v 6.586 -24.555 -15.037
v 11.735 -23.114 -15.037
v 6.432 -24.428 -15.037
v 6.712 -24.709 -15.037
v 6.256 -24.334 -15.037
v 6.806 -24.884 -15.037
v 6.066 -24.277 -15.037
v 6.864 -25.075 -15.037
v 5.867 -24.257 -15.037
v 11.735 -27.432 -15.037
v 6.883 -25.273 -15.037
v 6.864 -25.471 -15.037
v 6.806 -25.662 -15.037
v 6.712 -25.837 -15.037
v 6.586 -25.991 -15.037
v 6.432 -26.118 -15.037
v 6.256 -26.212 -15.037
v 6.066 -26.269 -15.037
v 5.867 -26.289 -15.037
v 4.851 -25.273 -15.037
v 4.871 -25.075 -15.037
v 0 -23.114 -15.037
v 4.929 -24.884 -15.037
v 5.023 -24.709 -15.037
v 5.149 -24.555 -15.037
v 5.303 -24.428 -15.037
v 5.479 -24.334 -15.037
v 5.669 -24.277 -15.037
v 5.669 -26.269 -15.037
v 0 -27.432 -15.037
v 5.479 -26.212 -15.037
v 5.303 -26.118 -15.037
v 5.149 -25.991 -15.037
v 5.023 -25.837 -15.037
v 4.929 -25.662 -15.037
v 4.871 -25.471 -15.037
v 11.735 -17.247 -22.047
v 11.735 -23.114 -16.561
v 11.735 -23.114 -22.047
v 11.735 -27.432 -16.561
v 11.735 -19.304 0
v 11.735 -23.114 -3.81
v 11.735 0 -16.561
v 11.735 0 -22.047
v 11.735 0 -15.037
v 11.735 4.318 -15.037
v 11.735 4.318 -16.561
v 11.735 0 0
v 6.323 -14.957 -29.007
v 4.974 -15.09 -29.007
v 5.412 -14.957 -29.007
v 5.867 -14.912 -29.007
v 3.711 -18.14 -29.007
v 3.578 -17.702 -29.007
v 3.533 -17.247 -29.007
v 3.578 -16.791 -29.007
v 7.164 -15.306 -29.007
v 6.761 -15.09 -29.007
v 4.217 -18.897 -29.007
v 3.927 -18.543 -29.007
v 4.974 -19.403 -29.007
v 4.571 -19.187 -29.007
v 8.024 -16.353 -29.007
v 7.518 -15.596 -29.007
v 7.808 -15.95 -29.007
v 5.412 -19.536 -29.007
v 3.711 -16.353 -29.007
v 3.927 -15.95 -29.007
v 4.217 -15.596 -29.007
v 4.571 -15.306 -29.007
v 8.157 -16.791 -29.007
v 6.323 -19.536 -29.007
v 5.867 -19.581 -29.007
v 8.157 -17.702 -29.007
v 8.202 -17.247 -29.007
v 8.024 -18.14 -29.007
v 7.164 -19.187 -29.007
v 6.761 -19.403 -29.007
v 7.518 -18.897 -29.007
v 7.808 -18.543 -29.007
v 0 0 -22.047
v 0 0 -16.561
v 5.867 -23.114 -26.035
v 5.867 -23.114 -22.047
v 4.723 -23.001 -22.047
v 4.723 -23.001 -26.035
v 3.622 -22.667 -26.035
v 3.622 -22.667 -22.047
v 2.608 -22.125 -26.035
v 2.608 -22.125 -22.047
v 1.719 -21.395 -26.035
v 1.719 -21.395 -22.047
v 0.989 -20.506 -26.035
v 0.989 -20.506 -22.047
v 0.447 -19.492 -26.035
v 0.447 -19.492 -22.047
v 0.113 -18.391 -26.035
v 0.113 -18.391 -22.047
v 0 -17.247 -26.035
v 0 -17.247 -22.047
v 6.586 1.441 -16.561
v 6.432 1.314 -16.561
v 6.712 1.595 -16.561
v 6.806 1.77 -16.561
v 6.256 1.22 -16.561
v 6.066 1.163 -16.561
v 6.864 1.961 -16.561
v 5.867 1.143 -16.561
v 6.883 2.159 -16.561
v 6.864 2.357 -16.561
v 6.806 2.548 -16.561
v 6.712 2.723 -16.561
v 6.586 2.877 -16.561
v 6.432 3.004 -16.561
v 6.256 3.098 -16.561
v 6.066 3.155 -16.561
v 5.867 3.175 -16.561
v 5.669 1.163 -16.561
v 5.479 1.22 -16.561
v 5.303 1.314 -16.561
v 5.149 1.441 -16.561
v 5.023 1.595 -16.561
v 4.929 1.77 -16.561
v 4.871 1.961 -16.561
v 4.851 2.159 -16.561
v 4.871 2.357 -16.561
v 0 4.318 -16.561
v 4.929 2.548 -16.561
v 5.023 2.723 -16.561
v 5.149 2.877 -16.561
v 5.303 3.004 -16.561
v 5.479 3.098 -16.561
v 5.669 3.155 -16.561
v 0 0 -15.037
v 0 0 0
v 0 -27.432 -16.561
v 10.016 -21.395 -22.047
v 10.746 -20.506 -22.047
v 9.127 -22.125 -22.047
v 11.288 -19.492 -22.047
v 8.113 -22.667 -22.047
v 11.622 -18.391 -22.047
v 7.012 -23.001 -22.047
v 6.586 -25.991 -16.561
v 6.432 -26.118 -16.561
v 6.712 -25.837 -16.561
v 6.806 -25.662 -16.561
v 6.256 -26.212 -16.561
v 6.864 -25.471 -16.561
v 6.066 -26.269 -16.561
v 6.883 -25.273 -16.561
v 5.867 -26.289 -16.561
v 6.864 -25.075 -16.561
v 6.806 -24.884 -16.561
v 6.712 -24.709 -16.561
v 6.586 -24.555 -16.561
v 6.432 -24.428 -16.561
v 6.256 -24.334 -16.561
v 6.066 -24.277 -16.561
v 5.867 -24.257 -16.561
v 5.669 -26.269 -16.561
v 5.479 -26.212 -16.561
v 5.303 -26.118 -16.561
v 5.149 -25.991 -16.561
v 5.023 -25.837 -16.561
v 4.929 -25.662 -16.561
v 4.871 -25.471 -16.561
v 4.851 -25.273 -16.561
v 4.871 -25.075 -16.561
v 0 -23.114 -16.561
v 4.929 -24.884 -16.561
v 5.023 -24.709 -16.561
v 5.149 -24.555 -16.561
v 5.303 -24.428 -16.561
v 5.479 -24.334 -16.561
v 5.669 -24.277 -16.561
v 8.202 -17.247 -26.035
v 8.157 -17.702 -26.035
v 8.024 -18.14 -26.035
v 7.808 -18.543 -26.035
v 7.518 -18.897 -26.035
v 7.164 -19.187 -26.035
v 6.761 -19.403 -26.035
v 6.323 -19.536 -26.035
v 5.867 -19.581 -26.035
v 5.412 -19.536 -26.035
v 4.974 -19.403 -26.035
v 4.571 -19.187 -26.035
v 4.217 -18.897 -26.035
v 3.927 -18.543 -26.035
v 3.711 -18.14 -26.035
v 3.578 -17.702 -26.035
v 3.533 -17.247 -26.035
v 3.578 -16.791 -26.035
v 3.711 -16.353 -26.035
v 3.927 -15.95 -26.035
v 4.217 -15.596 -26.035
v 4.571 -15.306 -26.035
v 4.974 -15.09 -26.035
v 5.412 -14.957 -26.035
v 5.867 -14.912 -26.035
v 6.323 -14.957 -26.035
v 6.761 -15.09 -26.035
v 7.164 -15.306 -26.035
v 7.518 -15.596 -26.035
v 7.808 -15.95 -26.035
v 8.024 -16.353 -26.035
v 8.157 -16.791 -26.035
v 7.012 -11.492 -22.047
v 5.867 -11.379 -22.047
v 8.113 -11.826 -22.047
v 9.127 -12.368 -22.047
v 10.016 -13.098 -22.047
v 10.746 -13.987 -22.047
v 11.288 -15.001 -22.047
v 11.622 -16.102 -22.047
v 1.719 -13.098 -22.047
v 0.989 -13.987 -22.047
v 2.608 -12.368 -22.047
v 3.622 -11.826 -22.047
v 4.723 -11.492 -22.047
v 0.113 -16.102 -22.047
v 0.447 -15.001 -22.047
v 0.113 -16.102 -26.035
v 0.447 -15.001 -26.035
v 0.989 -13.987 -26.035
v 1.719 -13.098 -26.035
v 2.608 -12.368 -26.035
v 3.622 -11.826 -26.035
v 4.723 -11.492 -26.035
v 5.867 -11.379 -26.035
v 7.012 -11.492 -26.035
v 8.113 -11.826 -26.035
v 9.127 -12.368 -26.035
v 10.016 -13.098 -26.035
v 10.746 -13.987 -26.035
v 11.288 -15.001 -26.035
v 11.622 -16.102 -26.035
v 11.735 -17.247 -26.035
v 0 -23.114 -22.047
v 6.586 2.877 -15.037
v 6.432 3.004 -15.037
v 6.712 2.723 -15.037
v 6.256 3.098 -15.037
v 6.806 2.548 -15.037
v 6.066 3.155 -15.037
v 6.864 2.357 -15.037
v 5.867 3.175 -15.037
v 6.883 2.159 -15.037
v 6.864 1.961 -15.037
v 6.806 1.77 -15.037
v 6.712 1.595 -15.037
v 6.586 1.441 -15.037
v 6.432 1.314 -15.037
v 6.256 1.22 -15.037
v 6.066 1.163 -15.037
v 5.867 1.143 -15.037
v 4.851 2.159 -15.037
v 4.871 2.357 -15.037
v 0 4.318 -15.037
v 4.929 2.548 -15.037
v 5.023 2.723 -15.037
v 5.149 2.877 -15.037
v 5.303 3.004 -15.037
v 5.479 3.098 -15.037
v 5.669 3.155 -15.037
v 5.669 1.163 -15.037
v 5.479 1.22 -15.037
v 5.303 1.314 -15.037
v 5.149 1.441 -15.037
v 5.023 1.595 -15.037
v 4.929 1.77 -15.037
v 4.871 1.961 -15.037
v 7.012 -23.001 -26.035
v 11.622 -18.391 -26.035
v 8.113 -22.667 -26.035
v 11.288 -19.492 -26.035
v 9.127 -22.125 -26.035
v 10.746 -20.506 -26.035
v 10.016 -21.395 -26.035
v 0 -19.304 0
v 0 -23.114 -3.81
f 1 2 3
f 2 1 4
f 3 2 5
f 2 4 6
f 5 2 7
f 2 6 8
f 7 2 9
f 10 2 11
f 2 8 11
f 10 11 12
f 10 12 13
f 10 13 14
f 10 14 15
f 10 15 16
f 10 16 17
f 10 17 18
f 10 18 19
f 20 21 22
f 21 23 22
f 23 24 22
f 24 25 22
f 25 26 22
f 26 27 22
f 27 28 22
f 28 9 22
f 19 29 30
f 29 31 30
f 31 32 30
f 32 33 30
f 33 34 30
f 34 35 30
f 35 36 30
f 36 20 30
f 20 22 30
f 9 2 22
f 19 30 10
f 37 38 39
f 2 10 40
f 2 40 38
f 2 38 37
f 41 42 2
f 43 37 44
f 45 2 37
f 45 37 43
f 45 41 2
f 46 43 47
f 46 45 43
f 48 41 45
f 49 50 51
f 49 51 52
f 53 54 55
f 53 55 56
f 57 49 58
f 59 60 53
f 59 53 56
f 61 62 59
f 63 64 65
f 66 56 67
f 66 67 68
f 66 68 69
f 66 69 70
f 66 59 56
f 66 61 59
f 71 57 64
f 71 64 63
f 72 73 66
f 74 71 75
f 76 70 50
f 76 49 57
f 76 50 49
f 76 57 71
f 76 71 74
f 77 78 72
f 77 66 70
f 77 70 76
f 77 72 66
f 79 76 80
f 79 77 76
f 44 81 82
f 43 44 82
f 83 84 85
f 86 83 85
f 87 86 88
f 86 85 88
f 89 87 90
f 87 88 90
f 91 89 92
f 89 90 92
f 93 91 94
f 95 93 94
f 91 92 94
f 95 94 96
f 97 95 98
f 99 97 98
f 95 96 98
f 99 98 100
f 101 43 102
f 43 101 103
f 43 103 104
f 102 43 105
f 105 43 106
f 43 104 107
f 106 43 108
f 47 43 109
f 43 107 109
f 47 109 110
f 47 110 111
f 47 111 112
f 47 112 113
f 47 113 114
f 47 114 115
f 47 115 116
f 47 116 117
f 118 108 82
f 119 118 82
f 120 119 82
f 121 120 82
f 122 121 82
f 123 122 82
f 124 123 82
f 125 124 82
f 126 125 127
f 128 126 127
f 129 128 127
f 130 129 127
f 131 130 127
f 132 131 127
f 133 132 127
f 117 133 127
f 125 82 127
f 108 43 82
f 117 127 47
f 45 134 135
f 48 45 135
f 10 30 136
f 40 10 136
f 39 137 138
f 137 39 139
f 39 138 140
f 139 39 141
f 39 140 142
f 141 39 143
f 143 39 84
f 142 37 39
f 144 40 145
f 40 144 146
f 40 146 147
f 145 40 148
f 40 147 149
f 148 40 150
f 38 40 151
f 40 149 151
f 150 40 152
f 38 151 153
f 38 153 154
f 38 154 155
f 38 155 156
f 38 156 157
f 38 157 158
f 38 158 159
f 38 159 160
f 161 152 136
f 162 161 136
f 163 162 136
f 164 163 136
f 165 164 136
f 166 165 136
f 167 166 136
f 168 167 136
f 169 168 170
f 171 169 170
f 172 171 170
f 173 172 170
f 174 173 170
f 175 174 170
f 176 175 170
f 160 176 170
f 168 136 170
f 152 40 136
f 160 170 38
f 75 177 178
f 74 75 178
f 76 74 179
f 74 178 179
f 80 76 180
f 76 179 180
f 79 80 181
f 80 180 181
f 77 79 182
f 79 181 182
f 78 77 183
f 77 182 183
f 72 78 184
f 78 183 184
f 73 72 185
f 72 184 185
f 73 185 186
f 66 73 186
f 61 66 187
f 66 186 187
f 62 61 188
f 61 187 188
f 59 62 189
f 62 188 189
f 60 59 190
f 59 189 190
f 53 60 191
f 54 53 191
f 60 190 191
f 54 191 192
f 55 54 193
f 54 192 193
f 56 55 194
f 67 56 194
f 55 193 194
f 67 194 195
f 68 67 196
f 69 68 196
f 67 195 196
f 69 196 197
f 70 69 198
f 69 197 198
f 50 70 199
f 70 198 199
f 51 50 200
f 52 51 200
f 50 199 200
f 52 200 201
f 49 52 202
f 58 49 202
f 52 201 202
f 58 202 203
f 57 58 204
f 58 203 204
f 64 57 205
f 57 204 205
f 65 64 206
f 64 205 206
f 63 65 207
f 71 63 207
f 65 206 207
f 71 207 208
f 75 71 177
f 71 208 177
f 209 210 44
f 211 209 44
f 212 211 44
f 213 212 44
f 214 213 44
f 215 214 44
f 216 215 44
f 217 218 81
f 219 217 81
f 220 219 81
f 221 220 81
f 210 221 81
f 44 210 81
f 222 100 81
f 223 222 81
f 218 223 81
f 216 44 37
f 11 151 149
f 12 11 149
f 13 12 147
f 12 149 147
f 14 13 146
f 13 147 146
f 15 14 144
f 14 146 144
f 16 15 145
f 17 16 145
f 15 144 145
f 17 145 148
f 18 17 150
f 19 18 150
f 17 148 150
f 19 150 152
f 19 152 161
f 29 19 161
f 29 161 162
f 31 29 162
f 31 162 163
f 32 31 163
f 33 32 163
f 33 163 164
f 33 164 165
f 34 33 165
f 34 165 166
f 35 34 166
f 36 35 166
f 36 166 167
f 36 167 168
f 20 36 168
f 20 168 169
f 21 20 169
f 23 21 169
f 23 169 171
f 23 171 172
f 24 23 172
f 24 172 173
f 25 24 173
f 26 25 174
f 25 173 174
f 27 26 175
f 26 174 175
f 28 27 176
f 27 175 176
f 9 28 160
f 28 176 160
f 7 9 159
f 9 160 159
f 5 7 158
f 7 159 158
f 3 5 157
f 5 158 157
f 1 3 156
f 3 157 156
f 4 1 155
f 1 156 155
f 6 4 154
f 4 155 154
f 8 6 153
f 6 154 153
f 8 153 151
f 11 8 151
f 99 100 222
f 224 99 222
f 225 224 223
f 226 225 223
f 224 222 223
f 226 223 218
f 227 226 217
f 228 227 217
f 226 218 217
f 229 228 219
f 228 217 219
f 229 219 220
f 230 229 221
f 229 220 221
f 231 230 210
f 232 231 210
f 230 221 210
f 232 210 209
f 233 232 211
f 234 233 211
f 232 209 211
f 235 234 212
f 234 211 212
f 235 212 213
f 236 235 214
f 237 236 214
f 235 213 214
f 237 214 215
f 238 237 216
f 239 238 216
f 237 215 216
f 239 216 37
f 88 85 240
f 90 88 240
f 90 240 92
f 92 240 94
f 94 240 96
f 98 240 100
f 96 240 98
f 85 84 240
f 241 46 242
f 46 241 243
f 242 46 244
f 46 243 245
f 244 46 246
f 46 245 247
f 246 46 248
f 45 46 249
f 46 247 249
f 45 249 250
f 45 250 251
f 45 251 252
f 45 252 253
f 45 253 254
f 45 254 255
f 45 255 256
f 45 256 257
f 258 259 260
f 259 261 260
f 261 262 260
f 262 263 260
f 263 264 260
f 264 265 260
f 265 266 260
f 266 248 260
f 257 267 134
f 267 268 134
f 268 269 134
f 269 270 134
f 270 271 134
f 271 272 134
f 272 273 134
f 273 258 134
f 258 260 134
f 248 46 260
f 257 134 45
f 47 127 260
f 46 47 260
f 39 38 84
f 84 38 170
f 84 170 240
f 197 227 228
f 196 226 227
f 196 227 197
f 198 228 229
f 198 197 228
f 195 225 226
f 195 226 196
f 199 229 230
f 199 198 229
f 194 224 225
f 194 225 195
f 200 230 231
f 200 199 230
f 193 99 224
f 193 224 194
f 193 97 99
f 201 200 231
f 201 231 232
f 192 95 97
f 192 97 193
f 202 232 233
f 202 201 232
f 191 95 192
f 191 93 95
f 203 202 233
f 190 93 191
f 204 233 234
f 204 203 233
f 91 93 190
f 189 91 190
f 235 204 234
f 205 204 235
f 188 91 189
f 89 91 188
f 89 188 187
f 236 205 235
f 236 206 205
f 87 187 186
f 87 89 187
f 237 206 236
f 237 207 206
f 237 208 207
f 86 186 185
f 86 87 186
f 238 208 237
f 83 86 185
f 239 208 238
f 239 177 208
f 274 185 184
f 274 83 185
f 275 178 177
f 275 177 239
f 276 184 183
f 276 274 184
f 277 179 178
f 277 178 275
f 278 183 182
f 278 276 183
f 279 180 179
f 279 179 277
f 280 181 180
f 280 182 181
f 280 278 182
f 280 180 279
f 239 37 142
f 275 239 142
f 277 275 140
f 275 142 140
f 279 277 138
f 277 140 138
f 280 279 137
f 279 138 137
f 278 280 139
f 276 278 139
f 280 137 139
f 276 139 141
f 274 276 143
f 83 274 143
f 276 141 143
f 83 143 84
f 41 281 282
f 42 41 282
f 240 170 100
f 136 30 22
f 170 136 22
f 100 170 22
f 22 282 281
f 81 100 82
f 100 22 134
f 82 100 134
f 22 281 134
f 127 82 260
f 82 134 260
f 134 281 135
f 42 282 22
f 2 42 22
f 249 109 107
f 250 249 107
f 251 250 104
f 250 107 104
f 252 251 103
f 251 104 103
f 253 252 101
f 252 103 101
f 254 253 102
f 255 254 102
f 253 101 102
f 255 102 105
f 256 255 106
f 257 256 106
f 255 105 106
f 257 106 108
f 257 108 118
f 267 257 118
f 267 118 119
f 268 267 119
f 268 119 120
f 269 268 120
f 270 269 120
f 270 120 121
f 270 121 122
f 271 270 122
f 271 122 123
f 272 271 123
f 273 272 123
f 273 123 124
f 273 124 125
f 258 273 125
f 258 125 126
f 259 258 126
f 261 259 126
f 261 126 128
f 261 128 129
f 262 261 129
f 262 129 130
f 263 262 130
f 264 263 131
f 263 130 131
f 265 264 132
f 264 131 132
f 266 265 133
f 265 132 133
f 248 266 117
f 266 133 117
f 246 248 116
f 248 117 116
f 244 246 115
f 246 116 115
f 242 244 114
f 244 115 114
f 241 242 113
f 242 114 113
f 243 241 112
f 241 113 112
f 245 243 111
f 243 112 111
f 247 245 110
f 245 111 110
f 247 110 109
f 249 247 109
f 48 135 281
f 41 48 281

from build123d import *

# Parameters (mm, degrees)
F1_DEPTH = 11.7348
F3_DEPTH = 3.9878
F4_R     = 2.33426
F5_DEPTH = 2.9718
F6_R     = 1.016
F7_DEPTH = 25.4


with BuildPart() as f1:
    # F0 (on Right) → F1 (new body)
    with BuildSketch(Plane.YZ):
        Polygon((0, -15.0368), (0, 0), (-19.304, 0), (-23.114, -3.81), (-23.114, -15.0368), (-27.432, -15.0368), (-27.432, -16.5608), (-23.114, -16.5608), (-23.114, -22.0472), (0, -22.0472), (0, -16.5608), (4.318, -16.5608), (4.318, -15.0368), align=None)
    extrude(amount=F1_DEPTH)

    # F2 (on face) → F3 (join)
    with BuildSketch(Plane(origin=(0, 0, -22.0472), x_dir=(1, 0, 0), z_dir=(0, 0, -1))):
        with BuildLine():
            ThreePointArc((0, 17.2466), (5.8674, 11.3792), (11.7348, 17.2466))
            ThreePointArc((11.7348, 17.2466), (10.016278, 21.395478), (5.8674, 23.114))
            ThreePointArc((5.8674, 23.114), (1.718522, 21.395478), (0, 17.2466))
        make_face()
    extrude(amount=F3_DEPTH)

    # F4 (on face) → F5 (join)
    with BuildSketch(Plane(origin=(0, 0, -26.035), x_dir=(1, 0, 0), z_dir=(0, 0, -1))):
        with Locations((5.8674, 17.2466)):
            Circle(F4_R)
    extrude(amount=F5_DEPTH)

    # F6 (on face) → F7 (cut)
    with BuildSketch(Plane(origin=(0, 0, -16.5608), x_dir=(1, 0, 0), z_dir=(0, 0, -1))):
        with Locations((5.8674, 25.273)):
            Circle(F6_R)
        with Locations((5.8674, -2.159)):
            Circle(F6_R)
    extrude(amount=-F7_DEPTH, mode=Mode.SUBTRACT)


solid = f1.part
